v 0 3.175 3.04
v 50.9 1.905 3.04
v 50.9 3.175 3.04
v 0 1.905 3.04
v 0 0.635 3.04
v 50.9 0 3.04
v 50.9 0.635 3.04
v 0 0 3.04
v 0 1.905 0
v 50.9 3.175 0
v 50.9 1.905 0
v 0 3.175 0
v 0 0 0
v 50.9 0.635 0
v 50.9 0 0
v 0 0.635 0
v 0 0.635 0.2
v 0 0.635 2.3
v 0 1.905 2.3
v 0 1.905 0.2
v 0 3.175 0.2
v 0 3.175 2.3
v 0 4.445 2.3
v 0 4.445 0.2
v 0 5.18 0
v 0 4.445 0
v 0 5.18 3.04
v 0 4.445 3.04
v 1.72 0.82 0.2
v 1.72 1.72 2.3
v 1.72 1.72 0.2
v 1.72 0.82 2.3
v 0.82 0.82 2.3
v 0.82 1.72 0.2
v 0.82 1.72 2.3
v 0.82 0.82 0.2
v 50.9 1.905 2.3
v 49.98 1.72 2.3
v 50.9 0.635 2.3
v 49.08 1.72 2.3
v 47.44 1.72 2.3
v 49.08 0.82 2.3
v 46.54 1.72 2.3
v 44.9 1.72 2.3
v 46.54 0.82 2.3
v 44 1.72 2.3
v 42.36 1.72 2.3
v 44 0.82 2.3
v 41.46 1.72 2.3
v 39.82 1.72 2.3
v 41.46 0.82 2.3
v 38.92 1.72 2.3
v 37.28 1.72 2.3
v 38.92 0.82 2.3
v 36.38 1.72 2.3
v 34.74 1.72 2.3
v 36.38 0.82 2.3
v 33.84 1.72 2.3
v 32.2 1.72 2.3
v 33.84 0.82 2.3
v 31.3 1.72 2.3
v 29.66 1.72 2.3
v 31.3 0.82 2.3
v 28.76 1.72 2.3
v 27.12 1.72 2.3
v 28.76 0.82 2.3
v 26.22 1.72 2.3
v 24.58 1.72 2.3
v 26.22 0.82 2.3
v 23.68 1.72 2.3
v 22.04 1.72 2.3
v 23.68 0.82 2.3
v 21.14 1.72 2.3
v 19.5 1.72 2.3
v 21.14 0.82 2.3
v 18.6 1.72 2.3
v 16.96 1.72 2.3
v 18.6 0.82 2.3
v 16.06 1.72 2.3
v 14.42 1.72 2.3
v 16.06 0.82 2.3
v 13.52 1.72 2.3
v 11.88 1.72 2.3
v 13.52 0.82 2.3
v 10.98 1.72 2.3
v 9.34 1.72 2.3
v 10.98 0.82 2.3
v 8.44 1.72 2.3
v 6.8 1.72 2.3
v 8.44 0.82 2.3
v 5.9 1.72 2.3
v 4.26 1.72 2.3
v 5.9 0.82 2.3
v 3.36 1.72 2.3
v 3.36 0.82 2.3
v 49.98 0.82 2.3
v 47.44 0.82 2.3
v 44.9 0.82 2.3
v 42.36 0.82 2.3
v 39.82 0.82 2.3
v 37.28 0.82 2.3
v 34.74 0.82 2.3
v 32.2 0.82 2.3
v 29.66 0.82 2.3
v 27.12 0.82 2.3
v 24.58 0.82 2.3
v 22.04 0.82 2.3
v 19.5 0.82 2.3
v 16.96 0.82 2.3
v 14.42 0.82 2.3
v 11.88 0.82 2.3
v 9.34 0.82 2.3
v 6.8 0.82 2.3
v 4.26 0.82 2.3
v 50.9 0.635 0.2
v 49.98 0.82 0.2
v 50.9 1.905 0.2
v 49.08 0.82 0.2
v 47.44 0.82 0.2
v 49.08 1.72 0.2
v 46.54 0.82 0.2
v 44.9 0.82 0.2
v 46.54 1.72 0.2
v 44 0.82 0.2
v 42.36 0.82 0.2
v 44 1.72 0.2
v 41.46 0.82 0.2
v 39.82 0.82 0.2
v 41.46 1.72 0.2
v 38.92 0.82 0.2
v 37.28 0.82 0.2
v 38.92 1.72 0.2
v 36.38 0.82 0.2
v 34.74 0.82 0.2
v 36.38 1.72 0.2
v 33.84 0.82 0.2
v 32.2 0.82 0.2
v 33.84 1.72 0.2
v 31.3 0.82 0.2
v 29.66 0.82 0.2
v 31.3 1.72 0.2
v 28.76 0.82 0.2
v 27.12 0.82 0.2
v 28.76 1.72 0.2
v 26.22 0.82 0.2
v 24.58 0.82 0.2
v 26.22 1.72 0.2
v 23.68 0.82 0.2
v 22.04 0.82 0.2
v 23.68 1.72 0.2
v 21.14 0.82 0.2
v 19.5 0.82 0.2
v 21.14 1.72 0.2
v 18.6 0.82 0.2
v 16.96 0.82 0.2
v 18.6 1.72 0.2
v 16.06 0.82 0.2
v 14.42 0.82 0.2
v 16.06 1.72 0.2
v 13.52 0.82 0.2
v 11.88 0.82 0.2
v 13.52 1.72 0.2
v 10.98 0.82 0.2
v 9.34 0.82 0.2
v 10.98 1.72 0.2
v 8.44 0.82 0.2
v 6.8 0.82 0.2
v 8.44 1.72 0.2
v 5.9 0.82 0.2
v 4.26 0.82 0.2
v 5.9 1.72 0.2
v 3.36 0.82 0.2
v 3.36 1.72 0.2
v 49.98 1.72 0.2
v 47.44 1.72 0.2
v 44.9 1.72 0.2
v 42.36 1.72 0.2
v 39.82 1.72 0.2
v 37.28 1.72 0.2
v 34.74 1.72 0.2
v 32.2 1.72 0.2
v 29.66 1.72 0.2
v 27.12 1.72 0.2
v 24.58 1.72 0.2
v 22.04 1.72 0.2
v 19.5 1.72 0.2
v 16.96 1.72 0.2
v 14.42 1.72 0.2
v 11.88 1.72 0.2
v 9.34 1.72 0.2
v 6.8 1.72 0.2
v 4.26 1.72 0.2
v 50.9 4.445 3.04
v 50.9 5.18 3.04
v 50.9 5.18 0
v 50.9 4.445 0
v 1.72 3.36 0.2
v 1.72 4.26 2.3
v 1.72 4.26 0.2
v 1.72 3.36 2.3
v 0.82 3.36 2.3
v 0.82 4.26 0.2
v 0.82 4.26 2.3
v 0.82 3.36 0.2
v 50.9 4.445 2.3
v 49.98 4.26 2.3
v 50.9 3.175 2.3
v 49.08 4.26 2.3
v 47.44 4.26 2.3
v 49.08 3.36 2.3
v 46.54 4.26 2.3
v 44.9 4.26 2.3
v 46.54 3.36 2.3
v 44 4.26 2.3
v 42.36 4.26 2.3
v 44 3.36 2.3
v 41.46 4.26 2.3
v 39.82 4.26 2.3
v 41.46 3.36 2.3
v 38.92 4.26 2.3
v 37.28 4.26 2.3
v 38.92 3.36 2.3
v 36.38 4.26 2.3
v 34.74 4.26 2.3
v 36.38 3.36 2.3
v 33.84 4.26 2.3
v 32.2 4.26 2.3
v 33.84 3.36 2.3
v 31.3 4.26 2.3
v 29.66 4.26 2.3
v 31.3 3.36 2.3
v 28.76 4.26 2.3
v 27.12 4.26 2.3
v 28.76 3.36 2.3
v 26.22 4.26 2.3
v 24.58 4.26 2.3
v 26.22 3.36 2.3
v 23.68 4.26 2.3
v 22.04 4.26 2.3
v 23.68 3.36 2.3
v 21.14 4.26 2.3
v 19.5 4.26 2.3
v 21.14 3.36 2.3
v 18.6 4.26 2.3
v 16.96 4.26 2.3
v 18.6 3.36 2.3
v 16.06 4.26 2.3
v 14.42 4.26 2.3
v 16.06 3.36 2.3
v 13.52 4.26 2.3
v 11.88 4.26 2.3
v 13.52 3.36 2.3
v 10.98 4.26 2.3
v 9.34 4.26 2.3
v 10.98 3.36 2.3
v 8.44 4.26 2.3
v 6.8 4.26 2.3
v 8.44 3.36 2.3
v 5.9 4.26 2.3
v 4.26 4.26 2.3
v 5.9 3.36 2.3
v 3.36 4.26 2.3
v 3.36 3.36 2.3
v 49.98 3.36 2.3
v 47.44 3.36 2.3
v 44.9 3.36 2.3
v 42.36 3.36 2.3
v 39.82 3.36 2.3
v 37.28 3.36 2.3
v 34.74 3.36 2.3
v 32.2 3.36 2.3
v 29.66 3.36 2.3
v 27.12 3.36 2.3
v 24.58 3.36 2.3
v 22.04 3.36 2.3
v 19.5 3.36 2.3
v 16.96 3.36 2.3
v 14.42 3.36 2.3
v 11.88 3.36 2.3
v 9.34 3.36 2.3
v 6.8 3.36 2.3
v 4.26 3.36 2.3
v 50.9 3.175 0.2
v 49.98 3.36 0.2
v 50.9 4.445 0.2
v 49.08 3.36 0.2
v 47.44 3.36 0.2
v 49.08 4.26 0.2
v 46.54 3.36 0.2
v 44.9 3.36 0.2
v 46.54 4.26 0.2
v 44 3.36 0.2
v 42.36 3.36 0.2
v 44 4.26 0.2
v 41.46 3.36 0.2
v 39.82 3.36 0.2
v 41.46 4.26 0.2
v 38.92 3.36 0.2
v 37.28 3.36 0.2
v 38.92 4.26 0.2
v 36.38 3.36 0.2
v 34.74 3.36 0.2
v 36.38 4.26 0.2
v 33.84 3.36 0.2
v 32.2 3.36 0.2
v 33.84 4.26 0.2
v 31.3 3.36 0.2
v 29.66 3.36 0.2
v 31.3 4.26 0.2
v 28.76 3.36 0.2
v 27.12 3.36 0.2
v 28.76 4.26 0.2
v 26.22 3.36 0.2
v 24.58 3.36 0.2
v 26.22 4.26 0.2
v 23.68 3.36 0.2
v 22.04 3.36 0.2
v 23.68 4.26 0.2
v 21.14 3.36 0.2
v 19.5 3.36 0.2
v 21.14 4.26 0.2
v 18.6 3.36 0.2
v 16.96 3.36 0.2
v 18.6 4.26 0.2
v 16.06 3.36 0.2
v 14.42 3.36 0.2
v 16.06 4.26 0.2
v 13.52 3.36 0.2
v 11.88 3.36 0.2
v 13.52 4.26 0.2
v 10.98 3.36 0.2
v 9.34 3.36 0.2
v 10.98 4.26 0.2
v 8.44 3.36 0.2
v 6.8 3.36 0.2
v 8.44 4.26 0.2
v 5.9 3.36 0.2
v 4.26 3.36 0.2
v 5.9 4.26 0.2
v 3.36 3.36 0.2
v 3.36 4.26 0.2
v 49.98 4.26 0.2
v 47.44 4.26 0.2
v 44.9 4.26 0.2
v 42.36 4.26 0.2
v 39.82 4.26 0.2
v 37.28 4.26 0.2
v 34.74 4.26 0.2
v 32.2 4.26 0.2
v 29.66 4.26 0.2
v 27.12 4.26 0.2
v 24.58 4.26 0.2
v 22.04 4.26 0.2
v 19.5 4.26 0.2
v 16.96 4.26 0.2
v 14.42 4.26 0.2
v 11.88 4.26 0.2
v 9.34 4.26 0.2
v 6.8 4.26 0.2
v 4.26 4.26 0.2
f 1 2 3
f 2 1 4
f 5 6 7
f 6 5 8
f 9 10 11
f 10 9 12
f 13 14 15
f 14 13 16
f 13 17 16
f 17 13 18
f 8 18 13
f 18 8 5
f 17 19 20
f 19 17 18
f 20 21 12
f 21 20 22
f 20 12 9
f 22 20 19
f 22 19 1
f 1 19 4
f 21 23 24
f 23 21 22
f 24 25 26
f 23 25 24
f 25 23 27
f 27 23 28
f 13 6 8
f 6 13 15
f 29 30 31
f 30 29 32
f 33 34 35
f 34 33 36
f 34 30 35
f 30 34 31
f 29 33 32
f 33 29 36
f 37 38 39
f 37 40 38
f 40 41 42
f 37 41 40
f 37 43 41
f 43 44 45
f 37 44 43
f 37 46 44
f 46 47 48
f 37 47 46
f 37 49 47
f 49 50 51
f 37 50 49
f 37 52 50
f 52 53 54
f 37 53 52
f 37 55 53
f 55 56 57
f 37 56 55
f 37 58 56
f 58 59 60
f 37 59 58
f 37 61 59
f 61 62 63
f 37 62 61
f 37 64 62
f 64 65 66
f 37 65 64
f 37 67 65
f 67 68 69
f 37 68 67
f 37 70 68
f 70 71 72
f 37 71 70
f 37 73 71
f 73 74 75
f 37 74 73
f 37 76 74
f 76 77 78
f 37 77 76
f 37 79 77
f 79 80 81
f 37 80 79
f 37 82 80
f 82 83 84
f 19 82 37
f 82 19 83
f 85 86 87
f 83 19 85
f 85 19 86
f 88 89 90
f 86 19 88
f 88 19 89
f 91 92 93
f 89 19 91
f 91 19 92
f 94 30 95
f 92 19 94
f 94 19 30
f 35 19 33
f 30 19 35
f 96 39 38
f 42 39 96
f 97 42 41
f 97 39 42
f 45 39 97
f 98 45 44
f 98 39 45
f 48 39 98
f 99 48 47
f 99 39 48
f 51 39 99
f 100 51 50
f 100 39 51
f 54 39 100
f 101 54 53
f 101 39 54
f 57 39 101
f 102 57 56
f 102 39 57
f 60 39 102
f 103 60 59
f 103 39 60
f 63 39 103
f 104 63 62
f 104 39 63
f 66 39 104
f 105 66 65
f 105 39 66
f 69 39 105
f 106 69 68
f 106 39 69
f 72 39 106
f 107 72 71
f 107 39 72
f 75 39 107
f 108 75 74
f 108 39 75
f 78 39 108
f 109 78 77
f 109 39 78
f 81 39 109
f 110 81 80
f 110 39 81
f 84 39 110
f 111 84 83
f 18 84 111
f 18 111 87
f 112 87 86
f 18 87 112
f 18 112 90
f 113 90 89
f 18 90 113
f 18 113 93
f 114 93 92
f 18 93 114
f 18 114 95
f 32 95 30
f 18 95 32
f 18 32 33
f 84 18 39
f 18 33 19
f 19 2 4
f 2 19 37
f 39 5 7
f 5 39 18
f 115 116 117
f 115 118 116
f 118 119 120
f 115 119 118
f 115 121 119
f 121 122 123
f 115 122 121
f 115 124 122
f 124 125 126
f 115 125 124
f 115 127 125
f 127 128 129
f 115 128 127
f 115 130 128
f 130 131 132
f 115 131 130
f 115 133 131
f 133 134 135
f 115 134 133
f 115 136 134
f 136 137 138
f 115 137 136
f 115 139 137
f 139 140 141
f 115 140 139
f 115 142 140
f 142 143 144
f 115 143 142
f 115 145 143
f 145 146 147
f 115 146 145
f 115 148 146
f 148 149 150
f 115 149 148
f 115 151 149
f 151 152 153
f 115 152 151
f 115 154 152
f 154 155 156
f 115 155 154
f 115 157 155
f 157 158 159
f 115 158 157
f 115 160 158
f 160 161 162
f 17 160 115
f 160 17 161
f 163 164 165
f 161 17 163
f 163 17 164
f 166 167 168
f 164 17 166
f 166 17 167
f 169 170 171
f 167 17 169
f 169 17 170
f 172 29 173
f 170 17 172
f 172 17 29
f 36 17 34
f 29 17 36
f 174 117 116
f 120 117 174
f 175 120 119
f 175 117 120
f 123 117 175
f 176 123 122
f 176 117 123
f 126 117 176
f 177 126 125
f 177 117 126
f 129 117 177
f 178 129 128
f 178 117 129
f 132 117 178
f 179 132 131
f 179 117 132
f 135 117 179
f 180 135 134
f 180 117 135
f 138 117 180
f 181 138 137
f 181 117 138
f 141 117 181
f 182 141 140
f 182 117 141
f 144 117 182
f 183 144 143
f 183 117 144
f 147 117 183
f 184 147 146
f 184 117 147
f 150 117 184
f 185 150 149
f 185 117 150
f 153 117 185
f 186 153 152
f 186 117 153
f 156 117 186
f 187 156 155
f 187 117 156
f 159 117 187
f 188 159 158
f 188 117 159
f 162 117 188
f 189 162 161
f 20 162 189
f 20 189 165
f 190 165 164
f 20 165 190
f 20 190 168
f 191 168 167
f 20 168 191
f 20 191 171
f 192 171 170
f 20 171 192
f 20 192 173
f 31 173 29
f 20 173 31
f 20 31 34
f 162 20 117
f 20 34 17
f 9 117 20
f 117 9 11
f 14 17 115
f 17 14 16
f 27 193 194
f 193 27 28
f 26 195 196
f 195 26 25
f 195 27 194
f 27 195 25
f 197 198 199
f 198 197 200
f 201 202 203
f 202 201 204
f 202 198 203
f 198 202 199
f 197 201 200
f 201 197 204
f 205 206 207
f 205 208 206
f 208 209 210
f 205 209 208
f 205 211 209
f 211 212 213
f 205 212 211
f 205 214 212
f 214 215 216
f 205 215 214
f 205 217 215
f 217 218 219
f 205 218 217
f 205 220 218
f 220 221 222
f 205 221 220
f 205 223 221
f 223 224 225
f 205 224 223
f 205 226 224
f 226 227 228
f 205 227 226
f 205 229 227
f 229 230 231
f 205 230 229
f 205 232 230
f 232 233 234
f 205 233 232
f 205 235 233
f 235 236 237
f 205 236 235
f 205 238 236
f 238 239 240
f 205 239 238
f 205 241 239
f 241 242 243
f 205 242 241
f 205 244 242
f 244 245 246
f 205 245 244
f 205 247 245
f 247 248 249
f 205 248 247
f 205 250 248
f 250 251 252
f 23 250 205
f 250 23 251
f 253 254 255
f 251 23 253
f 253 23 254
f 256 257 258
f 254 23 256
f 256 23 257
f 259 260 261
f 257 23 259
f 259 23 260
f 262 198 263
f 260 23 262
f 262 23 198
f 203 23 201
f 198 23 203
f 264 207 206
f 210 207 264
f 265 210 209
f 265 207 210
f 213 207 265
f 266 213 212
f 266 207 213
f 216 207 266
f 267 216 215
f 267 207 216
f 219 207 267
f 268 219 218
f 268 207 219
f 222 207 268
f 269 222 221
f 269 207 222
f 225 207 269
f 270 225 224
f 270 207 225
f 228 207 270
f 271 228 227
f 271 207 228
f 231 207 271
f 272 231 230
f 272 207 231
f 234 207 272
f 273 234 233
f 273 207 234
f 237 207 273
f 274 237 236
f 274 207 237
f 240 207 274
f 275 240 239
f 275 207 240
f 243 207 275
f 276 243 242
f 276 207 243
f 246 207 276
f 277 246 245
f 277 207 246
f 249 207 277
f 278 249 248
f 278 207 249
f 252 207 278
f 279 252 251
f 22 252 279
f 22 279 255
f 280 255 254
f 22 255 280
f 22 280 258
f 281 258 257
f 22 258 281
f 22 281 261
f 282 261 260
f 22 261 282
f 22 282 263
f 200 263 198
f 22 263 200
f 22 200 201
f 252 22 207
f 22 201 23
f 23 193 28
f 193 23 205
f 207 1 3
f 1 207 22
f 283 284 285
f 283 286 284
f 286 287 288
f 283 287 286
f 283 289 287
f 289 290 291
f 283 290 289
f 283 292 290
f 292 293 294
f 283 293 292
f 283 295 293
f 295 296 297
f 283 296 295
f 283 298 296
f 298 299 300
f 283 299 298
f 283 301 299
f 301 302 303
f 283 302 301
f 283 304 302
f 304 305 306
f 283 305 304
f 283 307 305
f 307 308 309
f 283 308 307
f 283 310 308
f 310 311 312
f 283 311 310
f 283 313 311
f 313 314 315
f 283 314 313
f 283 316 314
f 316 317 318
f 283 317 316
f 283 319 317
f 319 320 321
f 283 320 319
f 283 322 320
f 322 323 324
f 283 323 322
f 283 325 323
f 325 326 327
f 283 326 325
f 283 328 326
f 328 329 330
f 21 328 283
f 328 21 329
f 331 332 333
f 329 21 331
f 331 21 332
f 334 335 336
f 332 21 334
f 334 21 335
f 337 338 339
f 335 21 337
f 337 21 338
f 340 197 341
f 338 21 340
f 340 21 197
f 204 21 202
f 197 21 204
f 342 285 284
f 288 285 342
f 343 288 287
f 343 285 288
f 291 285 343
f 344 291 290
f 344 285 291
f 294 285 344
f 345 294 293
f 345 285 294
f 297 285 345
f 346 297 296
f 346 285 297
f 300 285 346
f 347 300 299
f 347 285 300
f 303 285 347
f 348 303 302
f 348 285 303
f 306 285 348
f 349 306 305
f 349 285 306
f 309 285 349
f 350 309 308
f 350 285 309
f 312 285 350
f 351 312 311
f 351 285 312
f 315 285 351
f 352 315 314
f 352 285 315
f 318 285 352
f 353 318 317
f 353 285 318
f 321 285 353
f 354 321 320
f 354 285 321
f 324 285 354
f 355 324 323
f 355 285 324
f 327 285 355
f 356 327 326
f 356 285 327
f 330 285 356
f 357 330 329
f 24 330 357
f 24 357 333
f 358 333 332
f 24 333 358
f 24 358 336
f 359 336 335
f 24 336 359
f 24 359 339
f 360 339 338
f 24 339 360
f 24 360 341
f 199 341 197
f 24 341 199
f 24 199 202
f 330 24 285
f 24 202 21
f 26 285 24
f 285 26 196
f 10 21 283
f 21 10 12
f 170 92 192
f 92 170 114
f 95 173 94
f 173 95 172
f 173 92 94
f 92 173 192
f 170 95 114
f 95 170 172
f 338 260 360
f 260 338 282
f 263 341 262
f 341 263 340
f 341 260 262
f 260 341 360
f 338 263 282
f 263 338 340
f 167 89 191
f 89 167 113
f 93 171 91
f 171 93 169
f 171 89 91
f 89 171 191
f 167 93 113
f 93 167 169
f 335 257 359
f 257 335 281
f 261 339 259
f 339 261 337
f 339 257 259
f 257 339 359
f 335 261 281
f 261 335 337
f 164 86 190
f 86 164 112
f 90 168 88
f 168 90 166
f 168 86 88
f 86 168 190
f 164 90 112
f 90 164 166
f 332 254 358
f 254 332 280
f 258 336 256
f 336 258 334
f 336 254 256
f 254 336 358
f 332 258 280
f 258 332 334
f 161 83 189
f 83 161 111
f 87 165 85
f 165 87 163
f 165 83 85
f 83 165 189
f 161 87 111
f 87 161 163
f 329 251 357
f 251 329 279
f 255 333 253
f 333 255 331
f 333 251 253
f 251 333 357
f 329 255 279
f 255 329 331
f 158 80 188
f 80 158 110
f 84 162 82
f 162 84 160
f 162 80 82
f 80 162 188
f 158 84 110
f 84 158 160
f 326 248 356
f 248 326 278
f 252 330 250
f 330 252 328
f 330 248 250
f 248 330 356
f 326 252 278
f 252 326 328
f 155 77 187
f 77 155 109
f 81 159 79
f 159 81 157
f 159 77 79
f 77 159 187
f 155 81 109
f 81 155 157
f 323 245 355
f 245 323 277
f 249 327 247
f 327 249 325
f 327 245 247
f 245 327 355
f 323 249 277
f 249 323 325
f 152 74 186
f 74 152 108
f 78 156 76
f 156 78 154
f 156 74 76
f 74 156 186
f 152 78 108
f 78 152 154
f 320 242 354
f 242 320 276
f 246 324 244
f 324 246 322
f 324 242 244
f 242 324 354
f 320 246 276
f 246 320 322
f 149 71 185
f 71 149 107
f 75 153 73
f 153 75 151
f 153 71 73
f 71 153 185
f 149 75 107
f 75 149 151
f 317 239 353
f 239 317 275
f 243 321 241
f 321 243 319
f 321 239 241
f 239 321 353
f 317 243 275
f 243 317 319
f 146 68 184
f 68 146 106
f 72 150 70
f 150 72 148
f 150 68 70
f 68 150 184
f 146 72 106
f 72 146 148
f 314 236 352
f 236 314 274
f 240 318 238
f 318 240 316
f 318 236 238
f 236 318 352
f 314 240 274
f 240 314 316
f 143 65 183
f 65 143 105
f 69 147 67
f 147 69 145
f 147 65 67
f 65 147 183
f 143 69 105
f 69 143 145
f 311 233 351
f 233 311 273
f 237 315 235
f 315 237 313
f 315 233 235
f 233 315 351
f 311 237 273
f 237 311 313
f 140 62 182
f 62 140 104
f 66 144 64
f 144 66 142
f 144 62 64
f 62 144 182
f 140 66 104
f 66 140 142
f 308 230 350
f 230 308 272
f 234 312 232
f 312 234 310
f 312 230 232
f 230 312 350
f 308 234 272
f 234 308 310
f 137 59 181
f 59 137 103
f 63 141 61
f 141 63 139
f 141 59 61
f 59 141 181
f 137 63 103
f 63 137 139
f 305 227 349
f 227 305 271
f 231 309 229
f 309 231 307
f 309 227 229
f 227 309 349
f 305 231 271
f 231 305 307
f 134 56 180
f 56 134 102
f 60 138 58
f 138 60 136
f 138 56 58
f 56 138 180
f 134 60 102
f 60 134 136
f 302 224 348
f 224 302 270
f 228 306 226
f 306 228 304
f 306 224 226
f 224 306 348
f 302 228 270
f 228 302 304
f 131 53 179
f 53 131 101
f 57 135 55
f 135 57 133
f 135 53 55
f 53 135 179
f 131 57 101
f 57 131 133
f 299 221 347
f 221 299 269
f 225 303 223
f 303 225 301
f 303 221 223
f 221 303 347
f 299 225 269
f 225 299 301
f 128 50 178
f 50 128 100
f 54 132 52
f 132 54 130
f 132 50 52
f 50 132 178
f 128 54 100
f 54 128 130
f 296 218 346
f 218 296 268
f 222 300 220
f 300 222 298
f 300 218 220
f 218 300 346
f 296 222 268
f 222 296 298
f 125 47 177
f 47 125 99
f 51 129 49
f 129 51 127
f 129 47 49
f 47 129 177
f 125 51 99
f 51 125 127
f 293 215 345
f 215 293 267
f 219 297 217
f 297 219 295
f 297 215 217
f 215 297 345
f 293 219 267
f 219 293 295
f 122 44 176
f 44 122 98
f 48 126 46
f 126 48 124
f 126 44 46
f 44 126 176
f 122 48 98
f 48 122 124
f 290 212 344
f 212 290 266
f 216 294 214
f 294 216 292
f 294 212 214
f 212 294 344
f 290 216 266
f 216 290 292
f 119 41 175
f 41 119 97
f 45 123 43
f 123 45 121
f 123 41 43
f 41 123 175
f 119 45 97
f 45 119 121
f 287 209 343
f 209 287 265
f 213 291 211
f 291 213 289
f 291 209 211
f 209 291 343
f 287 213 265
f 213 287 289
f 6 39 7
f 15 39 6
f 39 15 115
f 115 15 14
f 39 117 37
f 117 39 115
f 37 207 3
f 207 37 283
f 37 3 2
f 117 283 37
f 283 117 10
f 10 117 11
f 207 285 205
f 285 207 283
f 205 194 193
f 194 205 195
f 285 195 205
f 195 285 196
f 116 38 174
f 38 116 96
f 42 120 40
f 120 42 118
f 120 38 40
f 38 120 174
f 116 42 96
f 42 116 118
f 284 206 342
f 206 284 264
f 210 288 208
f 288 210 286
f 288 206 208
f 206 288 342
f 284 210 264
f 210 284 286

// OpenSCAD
//双排插针的塑料档块
x1=48.26;
y=2.54;
x=2.54;
z=2.54+0.5;
r1=0.9;
module a(){
difference(){
cube([x+0.1,y+0.1,z]);
    translate([x/2-r1/2,y/2-r1/2,0]) cube([r1,r1,z]);
    translate([0,2.54/4,2.3]) cube([2.54*19,2.54/2,10]);
    translate([0,2.54/4,0]) cube([2.54*19,2.54/2,0.2]);
}
}
module b(){
for(a=[0,1,2,3,4,5,6,7,8,9,10,11,12,13,14,15,16,17,18,19]){
  translate([a*2.54,0,0])  a();
  translate([a*2.54,2.54,0])  a();
}
}
b();
